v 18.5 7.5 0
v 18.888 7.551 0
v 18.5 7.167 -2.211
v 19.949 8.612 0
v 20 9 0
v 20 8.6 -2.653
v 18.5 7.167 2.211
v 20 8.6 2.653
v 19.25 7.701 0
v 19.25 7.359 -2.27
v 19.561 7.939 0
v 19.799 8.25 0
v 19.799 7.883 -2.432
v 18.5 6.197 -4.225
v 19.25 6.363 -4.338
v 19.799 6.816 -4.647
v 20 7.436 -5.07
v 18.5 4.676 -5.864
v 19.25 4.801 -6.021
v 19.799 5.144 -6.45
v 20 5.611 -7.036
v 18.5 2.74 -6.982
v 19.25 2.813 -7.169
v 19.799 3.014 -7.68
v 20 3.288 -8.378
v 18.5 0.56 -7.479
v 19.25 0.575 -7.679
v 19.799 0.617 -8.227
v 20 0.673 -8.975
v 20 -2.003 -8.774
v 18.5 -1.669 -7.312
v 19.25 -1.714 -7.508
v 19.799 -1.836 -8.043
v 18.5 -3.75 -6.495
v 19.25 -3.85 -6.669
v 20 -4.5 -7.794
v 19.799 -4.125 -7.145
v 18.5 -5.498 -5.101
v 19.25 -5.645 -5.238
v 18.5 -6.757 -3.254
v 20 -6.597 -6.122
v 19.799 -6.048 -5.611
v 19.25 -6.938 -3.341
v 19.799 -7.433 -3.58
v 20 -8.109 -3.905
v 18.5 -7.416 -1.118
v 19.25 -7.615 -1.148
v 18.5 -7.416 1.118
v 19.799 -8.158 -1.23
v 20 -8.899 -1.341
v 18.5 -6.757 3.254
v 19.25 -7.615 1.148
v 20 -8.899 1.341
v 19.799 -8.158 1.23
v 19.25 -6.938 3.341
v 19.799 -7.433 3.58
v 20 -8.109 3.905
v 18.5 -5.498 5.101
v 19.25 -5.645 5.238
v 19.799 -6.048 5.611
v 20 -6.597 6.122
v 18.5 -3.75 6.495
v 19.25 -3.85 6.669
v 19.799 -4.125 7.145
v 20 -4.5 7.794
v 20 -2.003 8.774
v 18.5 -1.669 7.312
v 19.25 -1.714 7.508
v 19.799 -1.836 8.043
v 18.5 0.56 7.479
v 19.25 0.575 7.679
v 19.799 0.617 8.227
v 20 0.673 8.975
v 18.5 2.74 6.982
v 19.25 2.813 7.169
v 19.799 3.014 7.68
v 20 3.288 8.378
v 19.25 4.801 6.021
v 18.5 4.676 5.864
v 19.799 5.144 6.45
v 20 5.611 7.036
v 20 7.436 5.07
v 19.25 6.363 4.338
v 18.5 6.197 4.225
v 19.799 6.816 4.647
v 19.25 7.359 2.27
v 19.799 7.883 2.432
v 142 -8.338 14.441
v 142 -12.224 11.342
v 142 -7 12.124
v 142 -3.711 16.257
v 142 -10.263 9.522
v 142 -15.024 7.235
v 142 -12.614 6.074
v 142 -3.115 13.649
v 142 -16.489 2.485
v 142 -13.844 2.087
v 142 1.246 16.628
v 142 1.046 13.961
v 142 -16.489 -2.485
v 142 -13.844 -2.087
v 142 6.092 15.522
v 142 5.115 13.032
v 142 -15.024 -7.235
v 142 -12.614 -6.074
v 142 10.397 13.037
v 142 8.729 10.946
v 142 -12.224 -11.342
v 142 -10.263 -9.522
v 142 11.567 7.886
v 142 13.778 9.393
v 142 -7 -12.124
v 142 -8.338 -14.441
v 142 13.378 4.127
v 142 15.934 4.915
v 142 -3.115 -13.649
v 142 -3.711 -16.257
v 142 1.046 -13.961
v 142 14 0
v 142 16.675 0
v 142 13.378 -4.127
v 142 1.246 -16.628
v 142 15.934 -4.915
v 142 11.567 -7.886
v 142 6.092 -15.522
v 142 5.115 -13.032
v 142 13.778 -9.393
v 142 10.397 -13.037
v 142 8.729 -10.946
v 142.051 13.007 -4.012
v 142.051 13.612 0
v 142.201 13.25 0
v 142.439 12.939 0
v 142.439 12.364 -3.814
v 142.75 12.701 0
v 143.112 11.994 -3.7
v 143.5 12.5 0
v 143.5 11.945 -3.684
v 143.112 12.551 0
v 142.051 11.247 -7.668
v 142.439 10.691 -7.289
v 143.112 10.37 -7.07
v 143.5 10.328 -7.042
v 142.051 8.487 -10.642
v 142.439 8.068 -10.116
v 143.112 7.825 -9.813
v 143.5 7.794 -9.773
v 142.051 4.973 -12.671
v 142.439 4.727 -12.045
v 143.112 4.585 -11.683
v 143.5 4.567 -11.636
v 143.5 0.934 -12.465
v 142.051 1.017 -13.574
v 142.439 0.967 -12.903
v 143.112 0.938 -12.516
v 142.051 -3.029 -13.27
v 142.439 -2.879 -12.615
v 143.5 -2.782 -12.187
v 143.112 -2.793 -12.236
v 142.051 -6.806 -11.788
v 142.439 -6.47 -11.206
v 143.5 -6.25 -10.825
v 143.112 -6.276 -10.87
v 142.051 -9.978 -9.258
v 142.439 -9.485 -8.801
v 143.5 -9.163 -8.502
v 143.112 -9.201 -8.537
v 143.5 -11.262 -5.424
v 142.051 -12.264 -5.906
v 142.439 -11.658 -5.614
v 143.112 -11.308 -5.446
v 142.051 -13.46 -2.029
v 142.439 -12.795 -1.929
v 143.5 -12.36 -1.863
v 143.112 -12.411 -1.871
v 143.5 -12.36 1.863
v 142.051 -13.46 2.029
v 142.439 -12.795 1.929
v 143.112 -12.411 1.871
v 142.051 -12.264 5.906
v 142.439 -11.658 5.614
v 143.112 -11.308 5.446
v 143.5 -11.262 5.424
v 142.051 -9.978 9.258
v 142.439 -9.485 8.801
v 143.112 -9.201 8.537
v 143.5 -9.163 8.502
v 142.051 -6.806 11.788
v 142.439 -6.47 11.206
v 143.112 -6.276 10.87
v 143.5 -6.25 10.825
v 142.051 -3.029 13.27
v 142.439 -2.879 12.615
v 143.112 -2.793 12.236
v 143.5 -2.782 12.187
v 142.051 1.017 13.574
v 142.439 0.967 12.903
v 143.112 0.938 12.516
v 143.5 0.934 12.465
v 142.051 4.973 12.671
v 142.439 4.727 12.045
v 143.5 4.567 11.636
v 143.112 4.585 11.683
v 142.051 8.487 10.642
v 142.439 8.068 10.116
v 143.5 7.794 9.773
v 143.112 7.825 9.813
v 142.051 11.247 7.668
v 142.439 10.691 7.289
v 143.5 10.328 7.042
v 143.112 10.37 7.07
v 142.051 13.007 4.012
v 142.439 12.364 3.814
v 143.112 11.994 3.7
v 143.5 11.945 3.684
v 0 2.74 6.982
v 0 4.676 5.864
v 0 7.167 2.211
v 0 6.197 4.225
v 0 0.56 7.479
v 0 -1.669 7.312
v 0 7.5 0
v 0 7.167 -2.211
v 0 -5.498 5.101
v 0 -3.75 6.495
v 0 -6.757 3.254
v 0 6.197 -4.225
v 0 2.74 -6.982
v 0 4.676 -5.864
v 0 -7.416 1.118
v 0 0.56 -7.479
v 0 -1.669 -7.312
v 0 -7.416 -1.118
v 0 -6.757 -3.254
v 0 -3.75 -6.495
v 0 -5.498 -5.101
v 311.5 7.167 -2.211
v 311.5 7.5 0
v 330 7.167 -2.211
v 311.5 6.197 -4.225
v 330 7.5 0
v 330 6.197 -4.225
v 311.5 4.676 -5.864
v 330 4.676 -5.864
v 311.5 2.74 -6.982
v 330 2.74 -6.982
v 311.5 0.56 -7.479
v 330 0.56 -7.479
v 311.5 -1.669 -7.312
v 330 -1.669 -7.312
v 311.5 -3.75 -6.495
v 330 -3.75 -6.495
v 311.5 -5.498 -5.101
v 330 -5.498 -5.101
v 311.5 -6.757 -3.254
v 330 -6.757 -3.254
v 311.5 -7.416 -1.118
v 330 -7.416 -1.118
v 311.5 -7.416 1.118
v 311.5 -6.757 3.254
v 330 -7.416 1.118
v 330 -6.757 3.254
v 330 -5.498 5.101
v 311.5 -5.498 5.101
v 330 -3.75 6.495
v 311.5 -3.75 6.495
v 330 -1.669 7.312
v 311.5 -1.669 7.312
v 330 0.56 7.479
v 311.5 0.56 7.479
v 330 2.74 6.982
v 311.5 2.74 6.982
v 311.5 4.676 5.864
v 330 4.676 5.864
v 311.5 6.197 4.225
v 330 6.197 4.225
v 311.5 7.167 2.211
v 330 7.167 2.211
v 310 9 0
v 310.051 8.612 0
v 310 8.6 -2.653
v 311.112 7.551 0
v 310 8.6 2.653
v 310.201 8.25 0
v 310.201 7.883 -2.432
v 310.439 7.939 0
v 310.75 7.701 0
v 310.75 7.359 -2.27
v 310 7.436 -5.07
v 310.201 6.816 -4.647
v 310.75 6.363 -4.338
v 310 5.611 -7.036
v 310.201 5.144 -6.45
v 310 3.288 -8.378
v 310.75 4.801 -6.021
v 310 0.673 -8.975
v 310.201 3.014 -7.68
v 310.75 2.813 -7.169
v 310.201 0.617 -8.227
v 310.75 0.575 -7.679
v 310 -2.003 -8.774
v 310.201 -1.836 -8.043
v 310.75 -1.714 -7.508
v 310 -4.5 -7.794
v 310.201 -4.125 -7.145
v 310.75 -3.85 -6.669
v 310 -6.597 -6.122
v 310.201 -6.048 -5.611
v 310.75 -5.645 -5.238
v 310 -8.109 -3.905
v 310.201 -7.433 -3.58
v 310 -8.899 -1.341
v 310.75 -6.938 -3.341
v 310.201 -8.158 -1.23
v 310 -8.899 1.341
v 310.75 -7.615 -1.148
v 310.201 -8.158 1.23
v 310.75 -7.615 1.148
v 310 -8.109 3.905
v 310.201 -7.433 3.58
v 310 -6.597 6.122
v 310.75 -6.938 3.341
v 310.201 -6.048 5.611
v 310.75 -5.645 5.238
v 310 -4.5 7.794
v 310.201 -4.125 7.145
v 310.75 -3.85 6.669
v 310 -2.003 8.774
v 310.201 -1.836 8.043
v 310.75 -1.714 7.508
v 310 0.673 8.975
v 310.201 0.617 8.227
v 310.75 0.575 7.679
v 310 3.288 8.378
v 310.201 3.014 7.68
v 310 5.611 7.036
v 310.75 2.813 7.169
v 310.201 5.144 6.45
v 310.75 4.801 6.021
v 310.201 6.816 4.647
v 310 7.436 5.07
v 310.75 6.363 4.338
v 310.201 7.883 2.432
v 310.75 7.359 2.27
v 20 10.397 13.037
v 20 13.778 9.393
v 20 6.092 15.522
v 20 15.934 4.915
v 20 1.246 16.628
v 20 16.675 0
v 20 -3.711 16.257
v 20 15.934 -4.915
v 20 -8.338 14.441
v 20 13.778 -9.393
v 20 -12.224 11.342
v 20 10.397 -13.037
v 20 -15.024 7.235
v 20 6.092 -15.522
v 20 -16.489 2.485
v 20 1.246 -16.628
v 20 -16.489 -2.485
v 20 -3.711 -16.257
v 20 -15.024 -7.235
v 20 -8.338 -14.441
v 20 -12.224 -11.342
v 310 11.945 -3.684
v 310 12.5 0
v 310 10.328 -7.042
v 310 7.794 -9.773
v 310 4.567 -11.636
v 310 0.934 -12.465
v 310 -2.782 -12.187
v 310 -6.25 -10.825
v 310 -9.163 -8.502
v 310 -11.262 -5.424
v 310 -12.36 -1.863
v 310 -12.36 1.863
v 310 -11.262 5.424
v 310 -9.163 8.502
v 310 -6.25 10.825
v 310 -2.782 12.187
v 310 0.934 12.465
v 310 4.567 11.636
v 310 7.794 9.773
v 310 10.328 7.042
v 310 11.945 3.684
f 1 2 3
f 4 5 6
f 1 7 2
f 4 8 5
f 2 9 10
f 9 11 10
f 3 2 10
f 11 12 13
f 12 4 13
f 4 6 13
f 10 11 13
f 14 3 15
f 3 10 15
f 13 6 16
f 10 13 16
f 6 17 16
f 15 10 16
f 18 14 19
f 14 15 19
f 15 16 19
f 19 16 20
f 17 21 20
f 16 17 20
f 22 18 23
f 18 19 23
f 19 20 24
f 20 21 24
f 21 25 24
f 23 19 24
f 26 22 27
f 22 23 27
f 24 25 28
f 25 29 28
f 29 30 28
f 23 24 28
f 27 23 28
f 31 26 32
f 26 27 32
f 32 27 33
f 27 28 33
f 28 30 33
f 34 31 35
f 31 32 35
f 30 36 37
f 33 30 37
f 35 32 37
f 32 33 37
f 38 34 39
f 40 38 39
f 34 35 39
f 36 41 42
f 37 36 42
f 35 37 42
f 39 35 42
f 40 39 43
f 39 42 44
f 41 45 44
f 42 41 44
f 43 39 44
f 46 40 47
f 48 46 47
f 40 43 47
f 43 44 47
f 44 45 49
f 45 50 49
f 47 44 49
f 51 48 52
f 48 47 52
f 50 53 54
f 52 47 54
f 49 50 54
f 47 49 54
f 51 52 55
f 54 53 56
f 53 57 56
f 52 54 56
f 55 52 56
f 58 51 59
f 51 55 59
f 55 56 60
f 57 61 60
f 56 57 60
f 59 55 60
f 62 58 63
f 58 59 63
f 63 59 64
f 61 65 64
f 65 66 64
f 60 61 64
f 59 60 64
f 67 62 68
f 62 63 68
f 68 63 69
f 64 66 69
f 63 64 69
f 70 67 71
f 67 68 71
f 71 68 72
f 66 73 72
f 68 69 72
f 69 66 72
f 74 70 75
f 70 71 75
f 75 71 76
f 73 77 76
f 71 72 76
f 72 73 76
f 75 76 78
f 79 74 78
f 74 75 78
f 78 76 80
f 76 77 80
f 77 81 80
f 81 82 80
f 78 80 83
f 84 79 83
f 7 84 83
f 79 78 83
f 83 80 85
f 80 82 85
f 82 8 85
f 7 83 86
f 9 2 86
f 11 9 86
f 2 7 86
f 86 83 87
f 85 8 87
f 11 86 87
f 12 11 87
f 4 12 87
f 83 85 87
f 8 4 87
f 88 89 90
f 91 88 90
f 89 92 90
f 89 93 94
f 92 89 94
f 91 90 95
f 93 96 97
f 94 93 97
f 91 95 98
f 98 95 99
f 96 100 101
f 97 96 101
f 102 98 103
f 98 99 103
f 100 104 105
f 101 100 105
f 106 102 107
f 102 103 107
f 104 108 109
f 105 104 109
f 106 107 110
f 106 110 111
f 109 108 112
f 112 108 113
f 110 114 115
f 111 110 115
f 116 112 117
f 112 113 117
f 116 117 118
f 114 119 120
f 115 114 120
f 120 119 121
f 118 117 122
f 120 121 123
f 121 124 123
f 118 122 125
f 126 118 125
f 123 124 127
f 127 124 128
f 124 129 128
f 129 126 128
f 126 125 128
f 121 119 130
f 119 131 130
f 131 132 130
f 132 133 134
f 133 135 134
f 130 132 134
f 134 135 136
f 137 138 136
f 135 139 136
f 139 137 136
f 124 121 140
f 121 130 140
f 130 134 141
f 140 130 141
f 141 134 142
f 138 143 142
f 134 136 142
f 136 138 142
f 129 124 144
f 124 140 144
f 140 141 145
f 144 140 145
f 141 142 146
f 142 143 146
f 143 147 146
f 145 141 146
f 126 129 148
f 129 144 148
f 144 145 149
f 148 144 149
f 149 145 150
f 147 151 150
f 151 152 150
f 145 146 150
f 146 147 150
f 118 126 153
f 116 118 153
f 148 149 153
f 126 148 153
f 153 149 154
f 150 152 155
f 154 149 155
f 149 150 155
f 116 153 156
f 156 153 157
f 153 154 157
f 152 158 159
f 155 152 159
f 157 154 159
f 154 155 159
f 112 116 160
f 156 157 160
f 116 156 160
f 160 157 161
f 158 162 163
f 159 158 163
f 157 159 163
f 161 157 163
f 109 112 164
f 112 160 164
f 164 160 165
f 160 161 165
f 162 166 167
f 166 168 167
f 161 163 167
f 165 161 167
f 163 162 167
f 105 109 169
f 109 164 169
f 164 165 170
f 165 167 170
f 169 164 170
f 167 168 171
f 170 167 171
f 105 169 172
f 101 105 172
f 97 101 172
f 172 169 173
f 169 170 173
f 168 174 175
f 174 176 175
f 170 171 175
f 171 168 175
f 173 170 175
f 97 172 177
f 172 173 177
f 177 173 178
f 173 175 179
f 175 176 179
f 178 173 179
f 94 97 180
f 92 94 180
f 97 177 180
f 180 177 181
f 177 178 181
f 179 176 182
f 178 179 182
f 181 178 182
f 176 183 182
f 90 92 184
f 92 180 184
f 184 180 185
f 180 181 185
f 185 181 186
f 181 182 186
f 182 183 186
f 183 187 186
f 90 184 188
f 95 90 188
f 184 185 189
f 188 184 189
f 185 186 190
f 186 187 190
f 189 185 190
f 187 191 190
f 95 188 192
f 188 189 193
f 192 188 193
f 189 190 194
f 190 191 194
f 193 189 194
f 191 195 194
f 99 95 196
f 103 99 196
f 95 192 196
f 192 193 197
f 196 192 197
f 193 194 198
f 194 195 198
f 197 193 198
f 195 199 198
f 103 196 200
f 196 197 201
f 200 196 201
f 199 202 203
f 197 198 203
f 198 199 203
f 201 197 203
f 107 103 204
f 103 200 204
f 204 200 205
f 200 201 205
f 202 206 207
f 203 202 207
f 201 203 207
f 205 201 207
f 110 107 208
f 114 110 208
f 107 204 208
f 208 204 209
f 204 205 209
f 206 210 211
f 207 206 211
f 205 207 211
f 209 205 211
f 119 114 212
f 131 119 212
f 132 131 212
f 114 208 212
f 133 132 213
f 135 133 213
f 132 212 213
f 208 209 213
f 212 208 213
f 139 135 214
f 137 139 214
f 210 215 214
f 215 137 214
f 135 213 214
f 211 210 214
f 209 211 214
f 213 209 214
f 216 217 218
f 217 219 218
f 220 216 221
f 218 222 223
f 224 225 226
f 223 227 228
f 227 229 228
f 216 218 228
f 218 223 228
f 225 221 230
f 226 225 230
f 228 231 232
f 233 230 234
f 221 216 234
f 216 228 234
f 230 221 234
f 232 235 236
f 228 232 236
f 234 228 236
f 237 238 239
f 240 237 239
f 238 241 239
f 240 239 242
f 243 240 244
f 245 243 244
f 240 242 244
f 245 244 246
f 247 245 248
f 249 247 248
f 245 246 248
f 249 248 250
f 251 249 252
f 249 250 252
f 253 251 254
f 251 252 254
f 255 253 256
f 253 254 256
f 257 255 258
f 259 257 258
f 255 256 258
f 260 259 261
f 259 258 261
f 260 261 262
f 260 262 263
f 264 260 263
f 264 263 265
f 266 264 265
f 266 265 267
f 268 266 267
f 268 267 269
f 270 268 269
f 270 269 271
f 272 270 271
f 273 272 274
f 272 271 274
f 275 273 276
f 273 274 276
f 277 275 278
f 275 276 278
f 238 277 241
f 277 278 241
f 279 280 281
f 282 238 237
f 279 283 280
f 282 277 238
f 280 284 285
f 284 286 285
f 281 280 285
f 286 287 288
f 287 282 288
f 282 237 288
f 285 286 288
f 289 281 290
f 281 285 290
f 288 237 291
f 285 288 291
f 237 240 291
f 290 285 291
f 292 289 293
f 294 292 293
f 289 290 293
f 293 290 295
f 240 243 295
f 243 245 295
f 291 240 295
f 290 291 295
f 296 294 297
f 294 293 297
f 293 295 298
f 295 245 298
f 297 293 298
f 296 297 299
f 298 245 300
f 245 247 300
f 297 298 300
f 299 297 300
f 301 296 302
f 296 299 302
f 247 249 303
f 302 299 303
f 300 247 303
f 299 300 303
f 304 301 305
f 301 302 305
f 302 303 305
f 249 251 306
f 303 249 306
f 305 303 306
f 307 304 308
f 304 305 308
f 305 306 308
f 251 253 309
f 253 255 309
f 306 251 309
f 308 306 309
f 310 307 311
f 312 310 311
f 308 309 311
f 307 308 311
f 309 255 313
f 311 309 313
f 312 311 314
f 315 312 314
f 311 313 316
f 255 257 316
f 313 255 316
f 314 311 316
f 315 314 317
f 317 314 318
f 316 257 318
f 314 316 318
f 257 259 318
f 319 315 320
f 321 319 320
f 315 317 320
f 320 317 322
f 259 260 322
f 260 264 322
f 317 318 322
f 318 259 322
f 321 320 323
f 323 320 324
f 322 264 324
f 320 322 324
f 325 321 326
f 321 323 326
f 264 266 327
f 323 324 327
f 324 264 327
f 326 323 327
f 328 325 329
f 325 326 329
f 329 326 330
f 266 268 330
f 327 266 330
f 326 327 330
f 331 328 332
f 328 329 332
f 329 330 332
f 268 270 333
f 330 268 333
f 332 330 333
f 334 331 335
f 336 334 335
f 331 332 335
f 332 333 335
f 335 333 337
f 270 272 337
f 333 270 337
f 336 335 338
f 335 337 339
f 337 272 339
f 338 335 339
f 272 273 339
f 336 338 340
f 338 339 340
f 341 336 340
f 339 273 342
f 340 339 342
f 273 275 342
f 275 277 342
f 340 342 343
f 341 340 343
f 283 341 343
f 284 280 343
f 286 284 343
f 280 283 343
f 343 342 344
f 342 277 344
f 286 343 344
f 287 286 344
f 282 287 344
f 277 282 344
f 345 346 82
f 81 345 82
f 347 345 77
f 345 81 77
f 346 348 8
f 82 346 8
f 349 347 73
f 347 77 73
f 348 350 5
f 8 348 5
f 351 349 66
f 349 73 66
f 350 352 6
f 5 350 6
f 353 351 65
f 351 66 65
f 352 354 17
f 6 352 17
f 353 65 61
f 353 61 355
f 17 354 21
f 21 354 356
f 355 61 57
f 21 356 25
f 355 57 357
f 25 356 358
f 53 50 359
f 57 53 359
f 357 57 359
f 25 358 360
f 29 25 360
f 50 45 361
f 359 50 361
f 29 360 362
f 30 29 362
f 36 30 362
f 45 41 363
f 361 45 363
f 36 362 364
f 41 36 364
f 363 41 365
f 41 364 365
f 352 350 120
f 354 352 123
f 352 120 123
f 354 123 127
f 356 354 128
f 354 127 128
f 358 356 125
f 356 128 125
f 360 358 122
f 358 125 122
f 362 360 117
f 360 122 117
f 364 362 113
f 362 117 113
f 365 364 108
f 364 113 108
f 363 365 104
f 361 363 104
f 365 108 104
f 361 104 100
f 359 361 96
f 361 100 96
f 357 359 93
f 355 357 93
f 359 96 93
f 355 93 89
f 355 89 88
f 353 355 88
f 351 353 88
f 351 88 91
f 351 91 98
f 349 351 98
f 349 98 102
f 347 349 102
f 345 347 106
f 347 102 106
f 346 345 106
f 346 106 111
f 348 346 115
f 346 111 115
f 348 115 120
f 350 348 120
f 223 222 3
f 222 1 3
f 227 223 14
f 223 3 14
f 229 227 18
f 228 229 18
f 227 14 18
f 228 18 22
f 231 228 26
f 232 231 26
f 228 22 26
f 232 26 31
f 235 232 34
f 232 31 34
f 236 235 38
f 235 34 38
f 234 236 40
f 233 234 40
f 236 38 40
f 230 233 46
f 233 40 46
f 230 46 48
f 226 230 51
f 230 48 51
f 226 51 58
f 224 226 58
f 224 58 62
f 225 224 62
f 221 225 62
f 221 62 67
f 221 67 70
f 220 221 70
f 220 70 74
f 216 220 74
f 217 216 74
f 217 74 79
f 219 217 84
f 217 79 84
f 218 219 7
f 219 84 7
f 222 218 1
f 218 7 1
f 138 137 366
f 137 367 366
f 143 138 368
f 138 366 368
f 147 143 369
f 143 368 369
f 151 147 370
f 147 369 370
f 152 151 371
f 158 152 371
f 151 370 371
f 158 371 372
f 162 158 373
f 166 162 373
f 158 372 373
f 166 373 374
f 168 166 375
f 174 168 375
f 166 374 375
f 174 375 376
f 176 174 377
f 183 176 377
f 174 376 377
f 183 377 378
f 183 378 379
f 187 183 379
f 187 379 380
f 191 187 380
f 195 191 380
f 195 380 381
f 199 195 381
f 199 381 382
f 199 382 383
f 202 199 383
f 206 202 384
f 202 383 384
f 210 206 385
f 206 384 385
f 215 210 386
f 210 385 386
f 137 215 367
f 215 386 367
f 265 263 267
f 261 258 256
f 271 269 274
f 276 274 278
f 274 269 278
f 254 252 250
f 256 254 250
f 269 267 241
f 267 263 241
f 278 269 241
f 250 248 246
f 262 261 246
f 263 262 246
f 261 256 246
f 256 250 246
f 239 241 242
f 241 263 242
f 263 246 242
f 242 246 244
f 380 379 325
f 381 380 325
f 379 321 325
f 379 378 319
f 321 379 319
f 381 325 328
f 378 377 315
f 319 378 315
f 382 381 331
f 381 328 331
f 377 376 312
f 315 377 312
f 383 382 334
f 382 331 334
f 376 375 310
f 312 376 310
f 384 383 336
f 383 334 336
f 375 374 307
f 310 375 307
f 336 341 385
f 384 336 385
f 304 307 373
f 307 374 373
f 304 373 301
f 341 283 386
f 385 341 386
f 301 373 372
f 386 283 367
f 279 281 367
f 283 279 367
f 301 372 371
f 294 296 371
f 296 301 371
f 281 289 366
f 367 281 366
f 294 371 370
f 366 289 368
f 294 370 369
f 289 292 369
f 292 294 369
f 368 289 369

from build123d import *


with BuildPart() as part:
    # Sketch1 → Revolve1 (revolve)
    with BuildSketch(Plane.XY):
        with BuildLine():
            Line((0, 0), (0, 7.5))
            Line((0, 7.5), (18.5, 7.5))
            ThreePointArc((18.5, 7.5), (19.560660172, 7.939339828), (20, 9))
            Line((20, 9), (20, 16.675))
            Line((20, 16.675), (142, 16.675))
            Line((142, 16.675), (142, 14))
            ThreePointArc((142, 14), (142.439339828, 12.939339828), (143.5, 12.5))
            Line((143.5, 12.5), (310, 12.5))
            Line((310, 12.5), (310, 9))
            ThreePointArc((310, 9), (310.439339828, 7.939339828), (311.5, 7.5))
            Line((311.5, 7.5), (330, 7.5))
            Line((330, 7.5), (330, 0))
            Line((330, 0), (0, 0))
        make_face()
    revolve(axis=Axis((330, 0, 0), (-1, 0, 0)))


solid = part.part
